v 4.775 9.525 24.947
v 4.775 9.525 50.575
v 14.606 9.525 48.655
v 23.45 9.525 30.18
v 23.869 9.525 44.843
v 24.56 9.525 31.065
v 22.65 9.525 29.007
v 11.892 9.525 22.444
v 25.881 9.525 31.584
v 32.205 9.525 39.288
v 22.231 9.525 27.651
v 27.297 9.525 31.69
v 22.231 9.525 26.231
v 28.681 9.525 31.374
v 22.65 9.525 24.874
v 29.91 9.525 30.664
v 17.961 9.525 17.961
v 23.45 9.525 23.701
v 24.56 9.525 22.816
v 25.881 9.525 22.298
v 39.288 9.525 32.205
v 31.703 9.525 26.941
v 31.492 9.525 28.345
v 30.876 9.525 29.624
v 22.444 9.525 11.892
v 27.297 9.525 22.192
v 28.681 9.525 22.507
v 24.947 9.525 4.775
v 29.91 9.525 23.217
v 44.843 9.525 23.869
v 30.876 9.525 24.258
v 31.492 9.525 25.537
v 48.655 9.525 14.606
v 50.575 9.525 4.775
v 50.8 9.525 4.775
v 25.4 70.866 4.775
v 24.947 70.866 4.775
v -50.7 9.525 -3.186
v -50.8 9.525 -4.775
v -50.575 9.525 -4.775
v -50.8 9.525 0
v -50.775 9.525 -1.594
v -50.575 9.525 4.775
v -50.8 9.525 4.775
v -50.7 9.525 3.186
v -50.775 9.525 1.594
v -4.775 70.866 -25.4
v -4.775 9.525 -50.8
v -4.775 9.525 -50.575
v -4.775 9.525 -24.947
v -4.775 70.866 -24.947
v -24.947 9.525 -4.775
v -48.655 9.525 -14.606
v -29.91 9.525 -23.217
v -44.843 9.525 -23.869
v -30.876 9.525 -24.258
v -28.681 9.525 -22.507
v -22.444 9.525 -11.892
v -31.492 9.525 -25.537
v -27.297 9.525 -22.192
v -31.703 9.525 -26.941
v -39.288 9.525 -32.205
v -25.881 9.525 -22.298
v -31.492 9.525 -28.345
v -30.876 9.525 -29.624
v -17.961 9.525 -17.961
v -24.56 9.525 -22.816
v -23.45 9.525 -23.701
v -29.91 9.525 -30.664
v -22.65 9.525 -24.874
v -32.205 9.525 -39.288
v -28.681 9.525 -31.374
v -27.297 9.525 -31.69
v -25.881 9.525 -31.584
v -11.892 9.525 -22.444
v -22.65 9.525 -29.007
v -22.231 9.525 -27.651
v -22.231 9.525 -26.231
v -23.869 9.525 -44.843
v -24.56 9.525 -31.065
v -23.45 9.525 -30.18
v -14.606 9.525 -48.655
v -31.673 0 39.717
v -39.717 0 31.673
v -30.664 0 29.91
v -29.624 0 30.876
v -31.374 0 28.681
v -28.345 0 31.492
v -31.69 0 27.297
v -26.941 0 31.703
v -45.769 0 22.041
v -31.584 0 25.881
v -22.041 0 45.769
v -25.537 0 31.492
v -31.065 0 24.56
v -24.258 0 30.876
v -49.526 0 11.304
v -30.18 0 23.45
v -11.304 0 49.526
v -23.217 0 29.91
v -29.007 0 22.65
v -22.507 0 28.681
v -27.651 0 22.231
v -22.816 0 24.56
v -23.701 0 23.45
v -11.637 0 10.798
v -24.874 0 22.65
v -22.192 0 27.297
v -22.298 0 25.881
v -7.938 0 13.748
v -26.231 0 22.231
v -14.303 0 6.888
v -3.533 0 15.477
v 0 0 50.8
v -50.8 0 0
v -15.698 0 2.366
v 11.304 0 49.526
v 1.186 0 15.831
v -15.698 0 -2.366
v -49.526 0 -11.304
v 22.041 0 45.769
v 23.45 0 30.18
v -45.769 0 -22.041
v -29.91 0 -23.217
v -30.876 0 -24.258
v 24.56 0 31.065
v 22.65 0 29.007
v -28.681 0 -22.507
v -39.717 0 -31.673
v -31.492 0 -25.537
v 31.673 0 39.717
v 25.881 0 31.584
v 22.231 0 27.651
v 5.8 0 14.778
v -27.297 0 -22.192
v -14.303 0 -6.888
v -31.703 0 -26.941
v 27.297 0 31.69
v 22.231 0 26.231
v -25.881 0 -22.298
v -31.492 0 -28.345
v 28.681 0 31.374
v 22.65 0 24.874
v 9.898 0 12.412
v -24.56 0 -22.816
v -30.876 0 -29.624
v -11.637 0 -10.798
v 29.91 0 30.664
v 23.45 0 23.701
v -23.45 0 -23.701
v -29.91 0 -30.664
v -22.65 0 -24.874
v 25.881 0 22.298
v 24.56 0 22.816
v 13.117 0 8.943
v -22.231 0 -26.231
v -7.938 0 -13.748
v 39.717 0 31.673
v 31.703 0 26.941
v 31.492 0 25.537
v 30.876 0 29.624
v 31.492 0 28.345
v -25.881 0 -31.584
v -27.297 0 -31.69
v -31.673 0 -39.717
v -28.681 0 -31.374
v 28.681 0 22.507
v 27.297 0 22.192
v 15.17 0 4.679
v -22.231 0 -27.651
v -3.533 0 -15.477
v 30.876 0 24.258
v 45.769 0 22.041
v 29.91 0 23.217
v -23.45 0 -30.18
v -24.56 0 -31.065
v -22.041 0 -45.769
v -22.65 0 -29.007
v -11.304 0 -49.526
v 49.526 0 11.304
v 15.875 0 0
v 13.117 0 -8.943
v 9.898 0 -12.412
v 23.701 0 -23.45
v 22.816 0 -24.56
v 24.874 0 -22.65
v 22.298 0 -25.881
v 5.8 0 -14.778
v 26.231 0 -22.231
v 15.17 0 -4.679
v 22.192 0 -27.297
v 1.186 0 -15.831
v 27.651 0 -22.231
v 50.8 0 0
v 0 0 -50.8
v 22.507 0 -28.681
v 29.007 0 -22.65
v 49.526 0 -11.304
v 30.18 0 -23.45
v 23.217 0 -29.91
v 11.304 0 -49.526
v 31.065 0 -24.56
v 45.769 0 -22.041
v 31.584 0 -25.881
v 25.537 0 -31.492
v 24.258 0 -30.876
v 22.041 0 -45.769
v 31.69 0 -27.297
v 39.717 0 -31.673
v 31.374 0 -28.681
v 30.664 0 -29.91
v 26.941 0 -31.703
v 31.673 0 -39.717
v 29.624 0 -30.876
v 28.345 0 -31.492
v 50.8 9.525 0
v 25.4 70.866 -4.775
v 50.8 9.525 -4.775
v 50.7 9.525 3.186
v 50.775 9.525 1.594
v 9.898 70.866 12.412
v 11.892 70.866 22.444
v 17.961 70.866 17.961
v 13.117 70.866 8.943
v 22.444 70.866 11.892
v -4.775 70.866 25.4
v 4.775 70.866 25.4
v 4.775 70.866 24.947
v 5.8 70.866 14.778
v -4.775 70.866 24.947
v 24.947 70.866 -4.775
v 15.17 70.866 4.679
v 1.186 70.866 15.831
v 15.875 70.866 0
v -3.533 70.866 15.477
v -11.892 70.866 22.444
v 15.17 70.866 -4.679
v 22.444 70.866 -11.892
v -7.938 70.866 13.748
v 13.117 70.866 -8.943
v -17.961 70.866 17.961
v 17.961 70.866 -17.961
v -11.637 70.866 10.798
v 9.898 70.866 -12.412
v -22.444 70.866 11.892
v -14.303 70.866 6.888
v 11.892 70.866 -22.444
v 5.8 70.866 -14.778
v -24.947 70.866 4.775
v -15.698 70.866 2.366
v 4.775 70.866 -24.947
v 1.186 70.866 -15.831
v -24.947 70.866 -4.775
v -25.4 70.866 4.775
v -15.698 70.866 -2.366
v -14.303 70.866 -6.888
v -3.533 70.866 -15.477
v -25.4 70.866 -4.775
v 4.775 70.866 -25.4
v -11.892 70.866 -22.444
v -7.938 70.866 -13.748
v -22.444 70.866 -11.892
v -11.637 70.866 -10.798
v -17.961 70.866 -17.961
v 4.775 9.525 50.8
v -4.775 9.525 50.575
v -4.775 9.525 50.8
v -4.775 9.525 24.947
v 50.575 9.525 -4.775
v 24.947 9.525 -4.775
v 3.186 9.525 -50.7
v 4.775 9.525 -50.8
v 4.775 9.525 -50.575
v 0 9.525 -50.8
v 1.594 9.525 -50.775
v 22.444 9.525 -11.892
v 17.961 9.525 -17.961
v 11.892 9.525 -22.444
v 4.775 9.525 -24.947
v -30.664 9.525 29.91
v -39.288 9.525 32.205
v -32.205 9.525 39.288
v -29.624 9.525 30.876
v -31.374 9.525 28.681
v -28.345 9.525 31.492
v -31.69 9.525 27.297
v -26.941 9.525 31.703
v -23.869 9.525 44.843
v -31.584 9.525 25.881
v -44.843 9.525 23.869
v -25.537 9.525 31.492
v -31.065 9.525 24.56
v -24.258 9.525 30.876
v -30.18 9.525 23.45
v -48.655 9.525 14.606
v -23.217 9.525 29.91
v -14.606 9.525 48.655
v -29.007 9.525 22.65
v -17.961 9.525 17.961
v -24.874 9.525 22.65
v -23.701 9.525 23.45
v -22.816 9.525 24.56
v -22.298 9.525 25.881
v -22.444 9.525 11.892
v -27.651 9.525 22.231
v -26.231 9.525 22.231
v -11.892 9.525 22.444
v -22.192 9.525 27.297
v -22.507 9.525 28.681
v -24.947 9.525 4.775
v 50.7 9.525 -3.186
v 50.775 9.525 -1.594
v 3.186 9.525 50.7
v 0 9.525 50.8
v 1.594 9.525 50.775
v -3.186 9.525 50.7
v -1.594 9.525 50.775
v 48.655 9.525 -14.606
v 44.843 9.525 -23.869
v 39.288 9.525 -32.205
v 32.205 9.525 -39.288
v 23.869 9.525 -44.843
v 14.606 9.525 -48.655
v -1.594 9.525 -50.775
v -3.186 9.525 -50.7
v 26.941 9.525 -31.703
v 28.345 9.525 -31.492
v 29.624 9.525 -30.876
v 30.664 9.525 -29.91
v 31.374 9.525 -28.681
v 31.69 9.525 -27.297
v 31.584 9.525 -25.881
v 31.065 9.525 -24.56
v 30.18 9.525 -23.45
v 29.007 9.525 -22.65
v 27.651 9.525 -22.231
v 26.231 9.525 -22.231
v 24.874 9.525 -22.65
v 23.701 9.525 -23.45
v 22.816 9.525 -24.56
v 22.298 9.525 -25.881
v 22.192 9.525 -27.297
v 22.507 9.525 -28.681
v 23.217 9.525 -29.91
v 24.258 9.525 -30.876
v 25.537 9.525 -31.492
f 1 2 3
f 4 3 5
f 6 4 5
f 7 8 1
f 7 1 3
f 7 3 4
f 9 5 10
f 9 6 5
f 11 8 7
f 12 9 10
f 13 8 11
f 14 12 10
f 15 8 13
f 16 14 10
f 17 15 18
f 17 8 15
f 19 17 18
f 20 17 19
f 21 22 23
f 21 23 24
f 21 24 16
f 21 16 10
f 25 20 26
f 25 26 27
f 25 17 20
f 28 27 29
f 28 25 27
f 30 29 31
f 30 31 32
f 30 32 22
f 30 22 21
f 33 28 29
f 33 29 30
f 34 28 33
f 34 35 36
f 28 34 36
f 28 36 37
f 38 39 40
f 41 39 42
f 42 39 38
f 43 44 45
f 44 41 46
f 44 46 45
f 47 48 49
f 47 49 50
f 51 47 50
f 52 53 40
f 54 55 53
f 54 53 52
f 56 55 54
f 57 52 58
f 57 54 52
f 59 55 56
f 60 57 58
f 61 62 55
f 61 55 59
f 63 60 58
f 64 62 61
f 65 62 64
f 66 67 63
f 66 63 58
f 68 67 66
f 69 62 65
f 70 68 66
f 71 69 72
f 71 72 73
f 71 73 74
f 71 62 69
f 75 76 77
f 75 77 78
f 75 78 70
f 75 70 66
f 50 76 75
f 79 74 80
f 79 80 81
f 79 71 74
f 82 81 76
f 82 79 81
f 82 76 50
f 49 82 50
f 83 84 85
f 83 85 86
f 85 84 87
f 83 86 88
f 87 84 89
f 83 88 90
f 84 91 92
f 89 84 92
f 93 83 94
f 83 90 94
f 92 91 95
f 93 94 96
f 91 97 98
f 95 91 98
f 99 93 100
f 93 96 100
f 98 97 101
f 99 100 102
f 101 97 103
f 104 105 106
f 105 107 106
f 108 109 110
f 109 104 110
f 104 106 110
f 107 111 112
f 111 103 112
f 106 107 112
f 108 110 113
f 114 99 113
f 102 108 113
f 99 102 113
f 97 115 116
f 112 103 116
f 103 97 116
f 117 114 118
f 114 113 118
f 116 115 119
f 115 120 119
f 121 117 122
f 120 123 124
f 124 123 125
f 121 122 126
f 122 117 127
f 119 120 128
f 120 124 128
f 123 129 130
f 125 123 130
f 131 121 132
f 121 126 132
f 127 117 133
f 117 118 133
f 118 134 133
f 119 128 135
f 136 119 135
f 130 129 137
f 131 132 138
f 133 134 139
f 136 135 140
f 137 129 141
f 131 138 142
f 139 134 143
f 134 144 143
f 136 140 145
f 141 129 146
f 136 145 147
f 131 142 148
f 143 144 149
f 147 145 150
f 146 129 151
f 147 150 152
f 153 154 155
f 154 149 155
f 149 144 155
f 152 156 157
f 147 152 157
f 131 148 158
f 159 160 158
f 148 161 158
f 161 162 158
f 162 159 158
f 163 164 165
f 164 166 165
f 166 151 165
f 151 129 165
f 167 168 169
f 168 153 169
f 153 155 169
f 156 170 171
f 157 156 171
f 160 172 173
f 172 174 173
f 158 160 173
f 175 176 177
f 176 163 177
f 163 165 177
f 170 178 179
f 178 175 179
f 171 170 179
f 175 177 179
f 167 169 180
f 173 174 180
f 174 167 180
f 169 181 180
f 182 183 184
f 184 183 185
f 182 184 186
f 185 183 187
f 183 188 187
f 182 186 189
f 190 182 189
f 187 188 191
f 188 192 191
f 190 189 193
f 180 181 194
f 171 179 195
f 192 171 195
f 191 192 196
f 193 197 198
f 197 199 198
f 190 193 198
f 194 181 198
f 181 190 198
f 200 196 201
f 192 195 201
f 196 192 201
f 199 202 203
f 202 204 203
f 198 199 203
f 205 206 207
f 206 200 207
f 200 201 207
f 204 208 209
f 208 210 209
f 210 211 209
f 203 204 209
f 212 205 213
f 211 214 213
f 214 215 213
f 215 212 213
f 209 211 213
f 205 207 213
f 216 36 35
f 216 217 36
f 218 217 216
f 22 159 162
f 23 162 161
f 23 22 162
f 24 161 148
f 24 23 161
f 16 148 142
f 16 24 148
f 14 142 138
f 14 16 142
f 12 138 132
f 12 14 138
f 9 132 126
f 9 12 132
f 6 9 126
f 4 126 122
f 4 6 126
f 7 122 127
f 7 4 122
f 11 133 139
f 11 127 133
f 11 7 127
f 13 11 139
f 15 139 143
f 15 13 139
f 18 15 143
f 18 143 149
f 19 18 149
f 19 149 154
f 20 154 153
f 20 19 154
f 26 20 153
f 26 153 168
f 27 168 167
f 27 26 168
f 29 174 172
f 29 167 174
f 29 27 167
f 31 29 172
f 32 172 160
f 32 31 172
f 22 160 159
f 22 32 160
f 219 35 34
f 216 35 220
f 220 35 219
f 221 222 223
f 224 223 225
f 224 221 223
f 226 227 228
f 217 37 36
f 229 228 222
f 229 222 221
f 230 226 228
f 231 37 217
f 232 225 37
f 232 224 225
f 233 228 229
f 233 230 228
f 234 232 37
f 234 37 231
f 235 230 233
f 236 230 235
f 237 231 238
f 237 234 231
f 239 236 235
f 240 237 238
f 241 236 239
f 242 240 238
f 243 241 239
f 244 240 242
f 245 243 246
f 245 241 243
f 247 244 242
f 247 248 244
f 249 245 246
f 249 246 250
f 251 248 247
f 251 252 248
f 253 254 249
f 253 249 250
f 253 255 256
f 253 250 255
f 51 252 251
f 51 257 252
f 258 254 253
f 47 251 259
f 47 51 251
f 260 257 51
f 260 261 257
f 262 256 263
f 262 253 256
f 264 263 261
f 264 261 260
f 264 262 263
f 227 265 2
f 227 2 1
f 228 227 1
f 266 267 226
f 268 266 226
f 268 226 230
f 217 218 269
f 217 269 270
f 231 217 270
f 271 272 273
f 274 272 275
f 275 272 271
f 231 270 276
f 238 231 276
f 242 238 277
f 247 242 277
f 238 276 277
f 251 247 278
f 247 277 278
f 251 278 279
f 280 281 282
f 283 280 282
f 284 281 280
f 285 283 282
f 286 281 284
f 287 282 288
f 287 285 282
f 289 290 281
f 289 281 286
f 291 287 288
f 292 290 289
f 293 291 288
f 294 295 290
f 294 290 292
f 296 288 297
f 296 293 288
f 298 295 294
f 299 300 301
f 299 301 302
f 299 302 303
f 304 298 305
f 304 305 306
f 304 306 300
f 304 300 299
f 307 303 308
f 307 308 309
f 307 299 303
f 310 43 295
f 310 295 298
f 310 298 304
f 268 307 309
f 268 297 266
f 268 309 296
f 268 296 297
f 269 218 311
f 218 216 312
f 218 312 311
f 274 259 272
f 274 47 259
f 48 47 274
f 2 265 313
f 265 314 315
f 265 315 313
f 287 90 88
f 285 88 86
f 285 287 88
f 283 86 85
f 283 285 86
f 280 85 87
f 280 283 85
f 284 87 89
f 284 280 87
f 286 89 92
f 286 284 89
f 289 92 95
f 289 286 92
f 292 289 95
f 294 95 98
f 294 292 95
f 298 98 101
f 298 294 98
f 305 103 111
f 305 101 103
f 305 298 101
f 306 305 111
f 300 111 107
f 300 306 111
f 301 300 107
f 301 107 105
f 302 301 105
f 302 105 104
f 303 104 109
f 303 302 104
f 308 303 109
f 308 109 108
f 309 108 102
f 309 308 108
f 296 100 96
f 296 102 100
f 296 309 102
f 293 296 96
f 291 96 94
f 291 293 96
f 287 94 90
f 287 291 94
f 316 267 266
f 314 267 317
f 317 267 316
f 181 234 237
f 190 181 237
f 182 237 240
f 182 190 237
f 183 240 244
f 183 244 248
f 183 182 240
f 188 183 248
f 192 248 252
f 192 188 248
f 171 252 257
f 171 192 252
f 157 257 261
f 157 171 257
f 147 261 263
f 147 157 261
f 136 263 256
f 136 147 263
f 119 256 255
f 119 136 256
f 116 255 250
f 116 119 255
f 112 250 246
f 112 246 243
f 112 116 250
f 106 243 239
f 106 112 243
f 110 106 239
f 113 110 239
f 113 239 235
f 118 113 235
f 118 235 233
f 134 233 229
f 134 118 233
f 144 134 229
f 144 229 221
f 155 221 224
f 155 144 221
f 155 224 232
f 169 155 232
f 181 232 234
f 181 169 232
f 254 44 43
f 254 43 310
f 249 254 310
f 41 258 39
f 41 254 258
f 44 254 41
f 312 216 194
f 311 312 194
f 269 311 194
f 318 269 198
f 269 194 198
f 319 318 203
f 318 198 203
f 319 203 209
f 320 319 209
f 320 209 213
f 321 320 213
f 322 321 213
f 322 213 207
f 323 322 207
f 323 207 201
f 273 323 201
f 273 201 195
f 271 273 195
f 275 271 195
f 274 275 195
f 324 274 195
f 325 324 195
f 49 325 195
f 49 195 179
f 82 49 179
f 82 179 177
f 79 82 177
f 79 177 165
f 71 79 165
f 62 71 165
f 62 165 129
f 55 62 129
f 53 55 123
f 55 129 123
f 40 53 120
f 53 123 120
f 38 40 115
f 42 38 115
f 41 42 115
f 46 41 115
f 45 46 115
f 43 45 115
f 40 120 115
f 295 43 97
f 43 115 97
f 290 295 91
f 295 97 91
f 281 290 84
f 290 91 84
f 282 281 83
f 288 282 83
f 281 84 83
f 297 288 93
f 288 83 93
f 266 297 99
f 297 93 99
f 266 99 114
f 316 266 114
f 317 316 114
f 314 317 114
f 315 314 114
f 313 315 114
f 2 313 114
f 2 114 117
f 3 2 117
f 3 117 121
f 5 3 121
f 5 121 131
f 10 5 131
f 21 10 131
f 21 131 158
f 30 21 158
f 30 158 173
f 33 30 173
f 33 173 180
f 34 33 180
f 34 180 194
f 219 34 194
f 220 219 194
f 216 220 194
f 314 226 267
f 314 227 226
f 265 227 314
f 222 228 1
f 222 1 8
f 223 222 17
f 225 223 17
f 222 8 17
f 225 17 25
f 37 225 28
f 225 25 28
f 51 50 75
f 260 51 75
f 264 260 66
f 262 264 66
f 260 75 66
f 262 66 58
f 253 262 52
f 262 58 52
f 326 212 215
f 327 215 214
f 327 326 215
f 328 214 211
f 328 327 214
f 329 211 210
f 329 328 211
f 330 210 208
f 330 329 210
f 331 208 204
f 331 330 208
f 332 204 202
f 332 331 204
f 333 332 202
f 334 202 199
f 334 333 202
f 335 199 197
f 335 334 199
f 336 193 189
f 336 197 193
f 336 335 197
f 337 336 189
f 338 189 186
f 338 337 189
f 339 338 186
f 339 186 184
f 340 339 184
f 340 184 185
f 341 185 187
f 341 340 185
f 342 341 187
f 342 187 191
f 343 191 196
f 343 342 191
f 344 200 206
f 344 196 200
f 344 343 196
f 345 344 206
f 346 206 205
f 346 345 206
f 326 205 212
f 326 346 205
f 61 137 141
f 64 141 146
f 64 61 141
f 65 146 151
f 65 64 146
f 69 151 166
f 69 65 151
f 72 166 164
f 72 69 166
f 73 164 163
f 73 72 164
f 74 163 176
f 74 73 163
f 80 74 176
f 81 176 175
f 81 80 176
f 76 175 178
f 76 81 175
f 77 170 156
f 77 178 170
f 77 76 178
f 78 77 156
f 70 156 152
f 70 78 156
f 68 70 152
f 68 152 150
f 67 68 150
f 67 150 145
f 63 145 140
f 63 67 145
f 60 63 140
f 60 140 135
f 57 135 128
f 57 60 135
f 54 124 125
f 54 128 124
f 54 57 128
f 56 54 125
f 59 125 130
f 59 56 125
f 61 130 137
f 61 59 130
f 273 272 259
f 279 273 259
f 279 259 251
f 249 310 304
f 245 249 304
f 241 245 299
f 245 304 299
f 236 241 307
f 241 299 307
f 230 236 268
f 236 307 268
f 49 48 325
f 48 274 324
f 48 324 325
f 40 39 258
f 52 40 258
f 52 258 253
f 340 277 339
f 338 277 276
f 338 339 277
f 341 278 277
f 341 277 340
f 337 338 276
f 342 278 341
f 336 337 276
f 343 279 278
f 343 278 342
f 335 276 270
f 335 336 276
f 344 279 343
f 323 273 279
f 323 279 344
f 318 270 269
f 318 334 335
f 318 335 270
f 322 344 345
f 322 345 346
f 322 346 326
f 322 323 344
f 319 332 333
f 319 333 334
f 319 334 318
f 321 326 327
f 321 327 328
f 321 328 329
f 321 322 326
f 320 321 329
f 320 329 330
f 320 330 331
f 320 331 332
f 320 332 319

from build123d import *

# Parameters (mm, degrees)
SKETCH1_R           = 50.8
SKETCH1_R_2         = 15.875
BOSS_EXTRUDE1_DEPTH = 9.525
SKETCH4_R           = 25.4
SKETCH4_R_2         = 15.875
BOSS_EXTRUDE2_DEPTH = 61.341
BOSS_EXTRUDE3_DEPTH = 4.7752
CIRPATTERN1_COUNT   = 4


with BuildPart() as part:
    # Sketch1 → Boss-Extrude1 (new body)
    with BuildSketch(Plane(origin=(0, 0, 0), x_dir=(1, 0, 0), z_dir=(0, 1, 0))):
        Circle(SKETCH1_R)
        Circle(SKETCH1_R_2, mode=Mode.SUBTRACT)
    extrude(amount=BOSS_EXTRUDE1_DEPTH)

    # Sketch4 → Boss-Extrude2 (add)
    with BuildSketch(Plane(origin=(0, 9.525, 0), x_dir=(1, 0, 0), z_dir=(0, 1, 0))):
        Circle(SKETCH4_R)
        Circle(SKETCH4_R_2, mode=Mode.SUBTRACT)
    extrude(amount=BOSS_EXTRUDE2_DEPTH)

    # Sketch7 → Boss-Extrude3 (add, symmetric)
    with BuildSketch(Plane.XY):
        Polygon((-25.4, 70.866), (-50.8, 9.525), (-22.583366139, 9.525), (-22.583366139, 70.866), align=None)
    boss_extrude3 = extrude(amount=BOSS_EXTRUDE3_DEPTH, both=True)

    # Sketch9 → 1/4 (0.375) Diameter Hole1 (revolve, cut)
    with BuildSketch(Plane(origin=(-26.940768363, 9.525, 26.940768363), x_dir=(0, 0, 1), z_dir=(1, 0, 0))):
        Polygon((0, 0), (0, 21.911598698), (4.7625, 19.05), (4.7625, 0), align=None)
    f_1_4_0_375_diameter_hole1 = revolve(axis=Axis((-26.940768363, 15.875, 26.940768363), (0, -1, 0)), mode=Mode.SUBTRACT)

    # CirPattern1: Boss-Extrude3, 1/4 (0.375) Diameter Hole1 ×4 about axis
    cirpattern1_axis = Axis((0, 0, 0), (0, 1, 0))
    for i in range(1, CIRPATTERN1_COUNT):
        add(boss_extrude3.rotate(cirpattern1_axis, i * 360 / CIRPATTERN1_COUNT))
        add(f_1_4_0_375_diameter_hole1.rotate(cirpattern1_axis, i * 360 / CIRPATTERN1_COUNT), mode=Mode.SUBTRACT)


solid = part.part
